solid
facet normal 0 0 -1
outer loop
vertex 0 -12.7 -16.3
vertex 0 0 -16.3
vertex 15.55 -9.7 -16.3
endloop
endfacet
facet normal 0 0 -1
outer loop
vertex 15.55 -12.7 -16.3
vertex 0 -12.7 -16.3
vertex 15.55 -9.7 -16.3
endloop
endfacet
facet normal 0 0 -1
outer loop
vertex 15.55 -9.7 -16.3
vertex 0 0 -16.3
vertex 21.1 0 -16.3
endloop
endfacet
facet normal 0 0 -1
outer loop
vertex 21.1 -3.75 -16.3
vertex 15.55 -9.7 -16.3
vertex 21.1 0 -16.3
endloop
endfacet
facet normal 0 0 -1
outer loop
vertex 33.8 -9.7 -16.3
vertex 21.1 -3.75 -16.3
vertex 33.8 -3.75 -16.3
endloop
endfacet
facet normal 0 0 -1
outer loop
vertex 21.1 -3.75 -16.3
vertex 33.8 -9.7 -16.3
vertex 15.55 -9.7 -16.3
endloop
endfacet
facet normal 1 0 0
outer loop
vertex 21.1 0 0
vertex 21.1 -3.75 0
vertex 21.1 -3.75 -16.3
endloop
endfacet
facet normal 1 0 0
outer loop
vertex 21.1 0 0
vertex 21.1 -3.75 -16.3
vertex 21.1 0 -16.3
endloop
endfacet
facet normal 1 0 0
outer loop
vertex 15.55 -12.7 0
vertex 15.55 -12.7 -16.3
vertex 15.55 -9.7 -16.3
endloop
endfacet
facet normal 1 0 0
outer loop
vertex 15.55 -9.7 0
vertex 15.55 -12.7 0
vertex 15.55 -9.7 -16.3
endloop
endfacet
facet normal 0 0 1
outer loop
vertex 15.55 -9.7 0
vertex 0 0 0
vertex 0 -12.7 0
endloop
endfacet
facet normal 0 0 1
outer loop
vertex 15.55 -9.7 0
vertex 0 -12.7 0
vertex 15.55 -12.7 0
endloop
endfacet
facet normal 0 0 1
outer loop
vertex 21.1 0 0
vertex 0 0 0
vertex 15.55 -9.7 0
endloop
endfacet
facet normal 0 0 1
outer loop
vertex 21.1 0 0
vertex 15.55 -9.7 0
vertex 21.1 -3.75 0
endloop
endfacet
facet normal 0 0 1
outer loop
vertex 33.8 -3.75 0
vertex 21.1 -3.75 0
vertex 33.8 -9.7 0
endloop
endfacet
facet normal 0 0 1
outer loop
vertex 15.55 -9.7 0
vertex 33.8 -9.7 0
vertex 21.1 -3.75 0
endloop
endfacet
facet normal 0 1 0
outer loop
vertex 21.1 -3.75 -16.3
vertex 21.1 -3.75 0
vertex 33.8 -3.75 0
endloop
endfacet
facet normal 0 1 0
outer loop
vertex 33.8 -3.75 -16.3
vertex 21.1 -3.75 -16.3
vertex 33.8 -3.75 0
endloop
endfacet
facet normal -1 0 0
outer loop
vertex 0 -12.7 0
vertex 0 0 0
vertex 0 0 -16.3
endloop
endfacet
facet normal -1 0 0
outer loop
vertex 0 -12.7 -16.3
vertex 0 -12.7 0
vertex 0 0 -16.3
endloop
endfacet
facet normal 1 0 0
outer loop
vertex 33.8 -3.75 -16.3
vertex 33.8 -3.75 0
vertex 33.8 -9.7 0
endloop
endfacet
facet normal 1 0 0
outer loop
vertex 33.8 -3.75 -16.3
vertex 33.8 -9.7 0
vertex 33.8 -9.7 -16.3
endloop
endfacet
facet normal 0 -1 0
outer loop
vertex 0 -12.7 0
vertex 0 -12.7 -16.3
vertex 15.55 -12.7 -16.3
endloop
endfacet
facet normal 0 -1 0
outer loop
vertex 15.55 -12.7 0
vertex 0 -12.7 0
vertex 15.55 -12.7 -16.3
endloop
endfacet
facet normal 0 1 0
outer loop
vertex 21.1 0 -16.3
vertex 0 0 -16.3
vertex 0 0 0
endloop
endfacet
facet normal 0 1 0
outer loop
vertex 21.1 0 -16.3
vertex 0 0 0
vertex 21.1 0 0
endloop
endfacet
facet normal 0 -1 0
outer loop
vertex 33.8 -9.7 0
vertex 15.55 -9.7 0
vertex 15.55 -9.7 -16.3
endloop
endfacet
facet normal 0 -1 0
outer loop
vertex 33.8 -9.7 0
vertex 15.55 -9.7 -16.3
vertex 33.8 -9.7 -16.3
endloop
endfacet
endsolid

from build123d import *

# Parameters (mm, degrees)
SKETCH1_W           = 33.8
SKETCH1_H           = 16.3
BOSS_EXTRUDE1_DEPTH = 12.7
SKETCH2_W           = 18.25
SKETCH2_H           = 3
SKETCH2_W_2         = 12.7
SKETCH2_H_2         = 3.75
CUT_EXTRUDE1_DEPTH  = 40.615905896


with BuildPart() as part:
    # Sketch1 → Boss-Extrude1 (new body)
    with BuildSketch(Plane(origin=(0, 0, 0), x_dir=(1, 0, 0), z_dir=(0, 1, 0))):
        with Locations((16.9, 8.15)):
            Rectangle(SKETCH1_W, SKETCH1_H)
    extrude(amount=-BOSS_EXTRUDE1_DEPTH)

    # Sketch2 → Cut-Extrude1 (cut, through all)
    with BuildSketch(Plane.XY):
        with Locations((24.675, -11.2)):
            Rectangle(SKETCH2_W, SKETCH2_H)
        with Locations((27.45, -1.875)):
            Rectangle(SKETCH2_W_2, SKETCH2_H_2)
    extrude(amount=-CUT_EXTRUDE1_DEPTH, mode=Mode.SUBTRACT)


solid = part.part
